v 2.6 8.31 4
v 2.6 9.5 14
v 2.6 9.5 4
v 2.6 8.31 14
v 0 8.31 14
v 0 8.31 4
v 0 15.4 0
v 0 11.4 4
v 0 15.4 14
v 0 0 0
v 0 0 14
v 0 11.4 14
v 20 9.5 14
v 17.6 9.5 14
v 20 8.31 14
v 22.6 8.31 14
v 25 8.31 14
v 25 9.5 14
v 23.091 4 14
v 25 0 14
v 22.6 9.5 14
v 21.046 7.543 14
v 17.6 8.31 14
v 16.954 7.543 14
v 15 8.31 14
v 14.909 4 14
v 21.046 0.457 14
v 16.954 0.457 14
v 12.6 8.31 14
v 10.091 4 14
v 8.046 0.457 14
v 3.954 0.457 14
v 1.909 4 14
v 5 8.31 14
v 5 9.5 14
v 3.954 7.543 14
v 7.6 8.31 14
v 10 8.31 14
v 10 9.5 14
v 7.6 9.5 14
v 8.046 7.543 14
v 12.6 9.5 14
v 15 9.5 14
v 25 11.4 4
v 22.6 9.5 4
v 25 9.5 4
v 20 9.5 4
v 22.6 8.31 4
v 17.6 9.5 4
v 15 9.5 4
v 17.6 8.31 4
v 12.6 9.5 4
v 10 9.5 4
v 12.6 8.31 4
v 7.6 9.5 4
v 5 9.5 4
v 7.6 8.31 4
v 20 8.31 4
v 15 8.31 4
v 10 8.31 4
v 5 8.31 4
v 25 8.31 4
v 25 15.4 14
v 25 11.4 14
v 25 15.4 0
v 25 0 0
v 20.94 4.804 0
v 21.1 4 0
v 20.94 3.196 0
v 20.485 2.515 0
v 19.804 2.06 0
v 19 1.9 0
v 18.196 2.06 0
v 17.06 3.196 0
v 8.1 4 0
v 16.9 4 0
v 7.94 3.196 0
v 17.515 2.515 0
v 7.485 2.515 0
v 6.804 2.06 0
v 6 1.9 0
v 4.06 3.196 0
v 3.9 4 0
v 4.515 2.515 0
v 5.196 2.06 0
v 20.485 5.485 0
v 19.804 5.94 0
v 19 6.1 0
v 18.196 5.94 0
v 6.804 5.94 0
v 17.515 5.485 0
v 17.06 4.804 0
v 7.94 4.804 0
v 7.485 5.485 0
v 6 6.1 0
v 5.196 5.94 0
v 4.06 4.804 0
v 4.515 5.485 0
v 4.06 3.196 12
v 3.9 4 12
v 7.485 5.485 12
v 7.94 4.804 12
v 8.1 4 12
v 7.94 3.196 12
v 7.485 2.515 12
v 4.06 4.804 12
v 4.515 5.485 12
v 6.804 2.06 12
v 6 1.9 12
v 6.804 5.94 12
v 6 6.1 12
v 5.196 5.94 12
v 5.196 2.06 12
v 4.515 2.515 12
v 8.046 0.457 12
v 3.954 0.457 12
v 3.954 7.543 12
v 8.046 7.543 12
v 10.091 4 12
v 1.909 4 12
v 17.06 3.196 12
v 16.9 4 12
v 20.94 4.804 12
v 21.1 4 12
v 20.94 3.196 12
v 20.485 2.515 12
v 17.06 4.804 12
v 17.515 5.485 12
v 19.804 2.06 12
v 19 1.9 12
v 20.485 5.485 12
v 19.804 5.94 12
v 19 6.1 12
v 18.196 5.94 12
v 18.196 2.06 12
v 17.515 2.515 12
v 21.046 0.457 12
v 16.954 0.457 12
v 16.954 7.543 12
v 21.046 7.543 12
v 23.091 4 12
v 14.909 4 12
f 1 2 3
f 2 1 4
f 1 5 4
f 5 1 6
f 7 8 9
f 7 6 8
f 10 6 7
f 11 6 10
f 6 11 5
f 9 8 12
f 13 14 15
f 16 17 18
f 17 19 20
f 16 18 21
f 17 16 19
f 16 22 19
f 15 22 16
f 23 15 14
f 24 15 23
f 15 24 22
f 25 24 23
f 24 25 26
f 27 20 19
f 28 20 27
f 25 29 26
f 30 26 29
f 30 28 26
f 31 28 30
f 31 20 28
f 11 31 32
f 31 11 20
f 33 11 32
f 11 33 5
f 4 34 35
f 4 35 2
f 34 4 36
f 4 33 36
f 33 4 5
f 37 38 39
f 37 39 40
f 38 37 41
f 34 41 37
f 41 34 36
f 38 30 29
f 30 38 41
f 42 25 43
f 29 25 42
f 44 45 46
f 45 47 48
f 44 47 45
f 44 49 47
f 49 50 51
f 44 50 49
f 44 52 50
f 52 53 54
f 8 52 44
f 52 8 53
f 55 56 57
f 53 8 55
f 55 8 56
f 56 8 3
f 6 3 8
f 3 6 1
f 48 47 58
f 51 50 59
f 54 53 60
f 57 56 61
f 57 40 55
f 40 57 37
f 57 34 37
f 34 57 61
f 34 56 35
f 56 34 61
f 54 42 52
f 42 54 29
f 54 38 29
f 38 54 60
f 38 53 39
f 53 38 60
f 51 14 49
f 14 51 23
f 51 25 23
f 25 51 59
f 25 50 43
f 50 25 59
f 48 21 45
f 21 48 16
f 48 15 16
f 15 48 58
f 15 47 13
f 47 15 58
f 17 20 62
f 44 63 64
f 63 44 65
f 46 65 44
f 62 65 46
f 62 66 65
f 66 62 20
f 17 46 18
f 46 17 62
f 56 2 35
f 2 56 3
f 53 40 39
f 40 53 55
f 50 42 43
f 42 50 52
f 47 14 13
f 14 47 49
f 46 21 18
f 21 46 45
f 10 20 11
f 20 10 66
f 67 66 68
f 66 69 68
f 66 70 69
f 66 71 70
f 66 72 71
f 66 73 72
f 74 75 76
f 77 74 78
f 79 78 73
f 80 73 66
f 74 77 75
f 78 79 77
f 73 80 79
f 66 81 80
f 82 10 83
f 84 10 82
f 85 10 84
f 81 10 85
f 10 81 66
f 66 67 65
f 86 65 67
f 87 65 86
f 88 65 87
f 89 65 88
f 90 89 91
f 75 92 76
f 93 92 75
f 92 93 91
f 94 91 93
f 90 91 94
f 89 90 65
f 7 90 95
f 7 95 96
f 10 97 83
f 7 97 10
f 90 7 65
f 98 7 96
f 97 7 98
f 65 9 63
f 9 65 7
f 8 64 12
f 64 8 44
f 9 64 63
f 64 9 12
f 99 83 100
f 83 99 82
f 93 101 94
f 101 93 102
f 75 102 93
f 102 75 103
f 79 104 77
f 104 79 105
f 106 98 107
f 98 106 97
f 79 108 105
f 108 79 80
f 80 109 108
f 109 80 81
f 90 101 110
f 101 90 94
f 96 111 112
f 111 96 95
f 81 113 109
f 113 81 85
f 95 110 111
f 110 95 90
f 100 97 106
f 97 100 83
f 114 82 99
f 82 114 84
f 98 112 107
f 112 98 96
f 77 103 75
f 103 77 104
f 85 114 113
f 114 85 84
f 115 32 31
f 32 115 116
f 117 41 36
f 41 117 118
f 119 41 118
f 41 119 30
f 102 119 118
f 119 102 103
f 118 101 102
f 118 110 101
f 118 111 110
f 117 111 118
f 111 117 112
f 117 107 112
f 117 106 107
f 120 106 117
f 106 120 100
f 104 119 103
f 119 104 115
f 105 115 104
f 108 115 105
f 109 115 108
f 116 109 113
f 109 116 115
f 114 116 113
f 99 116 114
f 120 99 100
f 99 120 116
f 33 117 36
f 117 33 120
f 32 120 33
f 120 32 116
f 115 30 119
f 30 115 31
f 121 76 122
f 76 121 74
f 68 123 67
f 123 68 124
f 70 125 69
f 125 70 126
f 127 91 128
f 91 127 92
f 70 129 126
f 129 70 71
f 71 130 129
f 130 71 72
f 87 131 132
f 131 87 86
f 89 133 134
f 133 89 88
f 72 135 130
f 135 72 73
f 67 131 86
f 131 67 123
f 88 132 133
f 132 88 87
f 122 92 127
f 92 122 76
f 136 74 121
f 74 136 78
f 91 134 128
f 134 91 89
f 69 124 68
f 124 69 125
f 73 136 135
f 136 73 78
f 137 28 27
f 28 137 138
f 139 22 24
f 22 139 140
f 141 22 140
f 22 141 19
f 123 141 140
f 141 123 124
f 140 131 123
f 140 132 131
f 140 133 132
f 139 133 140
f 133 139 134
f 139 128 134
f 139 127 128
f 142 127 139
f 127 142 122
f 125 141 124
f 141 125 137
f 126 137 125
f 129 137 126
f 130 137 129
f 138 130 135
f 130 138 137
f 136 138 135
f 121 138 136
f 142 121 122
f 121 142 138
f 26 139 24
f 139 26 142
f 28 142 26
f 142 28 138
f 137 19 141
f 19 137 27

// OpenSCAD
// X-belt retainer/tensioner
// May 2012 John Newman

// This parameter deterimes how far the belt is held above the deck
dRise = 0;			// Added to the depth to make the belt run horizontal

// Belt dimensions - These are for T2.5, see below for T5
//tBase = 1.25;		// Thickness of belt base
//tFull = 2.0;			// Thickness of Belt at teeth
//wTooth = 1.4;		// Width of tooth (not actual, req)
//wSpace = 1.1;		// Width of space
//wBelt = 6.2;		// Width of belt

// Belt dimensions - These are for T5
tBase = 1.5;		// Thickness of belt base
tFull = 2.7;			// Thickness of Belt at teeth
wTooth = 2.6;		// Width of tooth (not actual, req)
wSpace = 2.4;		// Width of space
wBelt = 10;		// Width of belt


// Misc params
wHex = 6.9;		// Width of trap for hex nut
dHex	= 2.5;			// Depth of trap for hex nut
rM3 = 1.7;			// Radius of M3 bolt hole
sDrop = wHex/2-0.5; //2.8;		// Driver screw drop from base of slider
Adjust = 0.5;		// Spacing for things to fit inside other things!
pWidth = 9;			// Screw platform width
pHeight = 5;		// Screw platform height

// Base parameters
bwExt = 20;		// Widest part of base
bwInt = 15;			// inside width, where slider goes
blExt = 30;			// Overall length of base
blHed = 6;			// Head of base whch takes the strain !
bdExt = 12.5;		// This included a minimum floor thickness of 2mm (?)
bRoof = 2.8;		// The thickness of the roof which holds the slider in
bFloor = 1;			// The thickness of the floor under the slider (minimum)
bdSoc = bdExt-(bRoof+bFloor);		// 'Socket' depth for slider to go in

// Slider parameters
swMax = bwInt - Adjust;	// Wide part of slider
sdMax = bdSoc-Adjust;		// Height of slider

lBelt = blExt*2;		// Length of a bit of belt!
rMsk = blExt/3 ;		// Radius of part of mount masking...

module sliderpart() {
	difference() {
		cube([blExt-blHed,swMax,sdMax],center=true);
		// Make a hole for the bolt end
	//	translate([(blExt-blHed)/2-2,0,(sdMax/2)-sDrop]) rotate([30,0,0]) rotate([0,90,0]) cylinder(10,rM3+0.5,rM3+0.5,$fn=6);
		// Make a fracture to cause fill
		translate([(blExt-blHed)/2-4.2,0,(sdMax-tFull)/2+1]) cube([0.05,swMax-4.4,sdMax],center=true) ;
		// Finally indent for belt
		translate([-lBelt/2,-wBelt/2,-sdMax/2-0.1]) belt();
	}
}

// Note this is positioned so that the slider is centered on the XY plane
module basepart() {
	union() {
		difference() {
			translate([0,0,-dRise/2]) cube([blExt,bwExt,bdExt+dRise],center=true);
			// Remove the space for the slider
			translate([-blHed,0,(bFloor-bRoof)/2]) cube([blExt,bwInt,bdSoc],center=true);
			// Remove a hole for the bolt
			translate([(blExt/2-9),0,bFloor+sDrop-bdExt/2]) rotate([30,0,0]) rotate([0,90,0]) cylinder(15,rM3,rM3);
			// An indentation for the bolt head
			translate([(blExt/2)-(blHed+5-dHex),0,bFloor+sDrop-bdExt/2]) rotate([30,0,0]) rotate([0,90,0]) cylinder(5,wHex/2,wHex/2,$fn=6);
			// A slot for the belt to come through
			translate([blExt/2-blHed,0,(bdExt-tFull-0.61)/2-bRoof]) cube([15,wBelt+2,tFull+0.6],center=true);
		}
		translate([0,bwExt/2 + (pWidth/2-0.01),-bdExt/2+pHeight/2]) screwmount() ;
		translate([0,-(bwExt/2 + (pWidth/2-0.01)),-bdExt/2+pHeight/2]) screwmount() ;
	}
}

module belt() {
	cube([lBelt,wBelt,tBase]) ;
	for (inc = [0:(wTooth+wSpace):lBelt-wTooth]) translate([inc,0,tBase-0.01]) cube([wTooth,wBelt,(tFull-tBase)]) ;
}

module screwmount() {
	difference() {
		cube([blExt,pWidth,pHeight],center=true);
		// Bolt holes
		//translate([(blExt-pWidth)/2,0,-(pHeight/2+1)]) rotate([0,0,30]) cylinder(pHeight+2,rM3,rM3,$fn=6);
		translate([-(blExt-pWidth)/2,0,-(pHeight/2+1)]) rotate([0,0,30]) cylinder(pHeight+2,rM3,rM3,$fn=6);
		// Nut traps
		//translate([(blExt-pWidth)/2,0,pHeight/2-dHex-0.01]) rotate([0,0,30]) cylinder(5,wHex/2,wHex/2,$fn=6);
		translate([-(blExt-pWidth)/2,0,pHeight/2-dHex-0.01]) rotate([0,0,30]) cylinder(5,wHex/2,wHex/2,$fn=6);
	}
}



// ---- this is the only thing I've done, just using the belt shape for 
// ---- my purposes here, misan.


/*
translate([0,0,14]) rotate([-90,0,0])  {
//	union() {
	translate([0,10,0]) cube([25,4,15.4]);
	translate([0,0,12.4]) cube([25,14,3]);
}
*/


translate([0,0,14]) rotate([-90,0,0]) difference() {
	union() {
	translate([0,10,0]) cube([25,4,15.4]);
	translate([0,0,11.4]) cube([25,14,4]);
		difference() {
			cube([25,14,10]);
			translate([0,10,11]) 			rotate([180,0,0])  belt();
		}
	}

	translate([6,25,4]) rotate([90,0,0]) cylinder(d=4.2, h=30,$fn=16);
	translate([6,2,4]) rotate([90,0,0]) rotate([0,0,0]) cylinder(r=7 / cos(180 / 6) / 2 + 0.05, h=4,$fn=6);
     
	translate([19,25,4]) rotate([90,0,0]) cylinder(d=4.2, h=30,$fn=16);
	translate([19,2,4]) rotate([90,0,0]) rotate([0,0,0]) cylinder(r=7 / cos(180 / 6) / 2 + 0.05, h=4,$fn=6);

 
}




/*
translate([40,0,14]) rotate([-90,0,0]) difference() {
	union() {
	translate([0,10,0]) cube([25,4,15.4]);
	translate([0,0,11.4]) cube([25,14,4]);
		difference() {
			cube([25,14,11]);
			translate([0,10,12]) 			rotate([180,0,0])  belt();
		}
	}

	translate([6,25,4]) rotate([90,0,0]) cylinder(d=4.2, h=30,$fn=16);
	translate([6,2,4]) rotate([90,0,0]) rotate([0,0,0]) cylinder(r=7 / cos(180 / 6) / 2 + 0.05, h=4,$fn=6);
     
	translate([19,25,4]) rotate([90,0,0]) cylinder(d=4.2, h=30,$fn=16);
	translate([19,2,4]) rotate([90,0,0]) rotate([0,0,0]) cylinder(r=7 / cos(180 / 6) / 2 + 0.05, h=4,$fn=6);

 
    
//	translate([-1,7,4]) rotate([0,90,0]) cylinder(r=4.2/2, h=27,$fn=16);
//	translate([-1,7,4]) rotate([0,90,0]) rotate([0,0,0]) cylinder(r=7 / cos(180 / 6) / 2 + 0.05, h=4,$fn=6);
}
*/
